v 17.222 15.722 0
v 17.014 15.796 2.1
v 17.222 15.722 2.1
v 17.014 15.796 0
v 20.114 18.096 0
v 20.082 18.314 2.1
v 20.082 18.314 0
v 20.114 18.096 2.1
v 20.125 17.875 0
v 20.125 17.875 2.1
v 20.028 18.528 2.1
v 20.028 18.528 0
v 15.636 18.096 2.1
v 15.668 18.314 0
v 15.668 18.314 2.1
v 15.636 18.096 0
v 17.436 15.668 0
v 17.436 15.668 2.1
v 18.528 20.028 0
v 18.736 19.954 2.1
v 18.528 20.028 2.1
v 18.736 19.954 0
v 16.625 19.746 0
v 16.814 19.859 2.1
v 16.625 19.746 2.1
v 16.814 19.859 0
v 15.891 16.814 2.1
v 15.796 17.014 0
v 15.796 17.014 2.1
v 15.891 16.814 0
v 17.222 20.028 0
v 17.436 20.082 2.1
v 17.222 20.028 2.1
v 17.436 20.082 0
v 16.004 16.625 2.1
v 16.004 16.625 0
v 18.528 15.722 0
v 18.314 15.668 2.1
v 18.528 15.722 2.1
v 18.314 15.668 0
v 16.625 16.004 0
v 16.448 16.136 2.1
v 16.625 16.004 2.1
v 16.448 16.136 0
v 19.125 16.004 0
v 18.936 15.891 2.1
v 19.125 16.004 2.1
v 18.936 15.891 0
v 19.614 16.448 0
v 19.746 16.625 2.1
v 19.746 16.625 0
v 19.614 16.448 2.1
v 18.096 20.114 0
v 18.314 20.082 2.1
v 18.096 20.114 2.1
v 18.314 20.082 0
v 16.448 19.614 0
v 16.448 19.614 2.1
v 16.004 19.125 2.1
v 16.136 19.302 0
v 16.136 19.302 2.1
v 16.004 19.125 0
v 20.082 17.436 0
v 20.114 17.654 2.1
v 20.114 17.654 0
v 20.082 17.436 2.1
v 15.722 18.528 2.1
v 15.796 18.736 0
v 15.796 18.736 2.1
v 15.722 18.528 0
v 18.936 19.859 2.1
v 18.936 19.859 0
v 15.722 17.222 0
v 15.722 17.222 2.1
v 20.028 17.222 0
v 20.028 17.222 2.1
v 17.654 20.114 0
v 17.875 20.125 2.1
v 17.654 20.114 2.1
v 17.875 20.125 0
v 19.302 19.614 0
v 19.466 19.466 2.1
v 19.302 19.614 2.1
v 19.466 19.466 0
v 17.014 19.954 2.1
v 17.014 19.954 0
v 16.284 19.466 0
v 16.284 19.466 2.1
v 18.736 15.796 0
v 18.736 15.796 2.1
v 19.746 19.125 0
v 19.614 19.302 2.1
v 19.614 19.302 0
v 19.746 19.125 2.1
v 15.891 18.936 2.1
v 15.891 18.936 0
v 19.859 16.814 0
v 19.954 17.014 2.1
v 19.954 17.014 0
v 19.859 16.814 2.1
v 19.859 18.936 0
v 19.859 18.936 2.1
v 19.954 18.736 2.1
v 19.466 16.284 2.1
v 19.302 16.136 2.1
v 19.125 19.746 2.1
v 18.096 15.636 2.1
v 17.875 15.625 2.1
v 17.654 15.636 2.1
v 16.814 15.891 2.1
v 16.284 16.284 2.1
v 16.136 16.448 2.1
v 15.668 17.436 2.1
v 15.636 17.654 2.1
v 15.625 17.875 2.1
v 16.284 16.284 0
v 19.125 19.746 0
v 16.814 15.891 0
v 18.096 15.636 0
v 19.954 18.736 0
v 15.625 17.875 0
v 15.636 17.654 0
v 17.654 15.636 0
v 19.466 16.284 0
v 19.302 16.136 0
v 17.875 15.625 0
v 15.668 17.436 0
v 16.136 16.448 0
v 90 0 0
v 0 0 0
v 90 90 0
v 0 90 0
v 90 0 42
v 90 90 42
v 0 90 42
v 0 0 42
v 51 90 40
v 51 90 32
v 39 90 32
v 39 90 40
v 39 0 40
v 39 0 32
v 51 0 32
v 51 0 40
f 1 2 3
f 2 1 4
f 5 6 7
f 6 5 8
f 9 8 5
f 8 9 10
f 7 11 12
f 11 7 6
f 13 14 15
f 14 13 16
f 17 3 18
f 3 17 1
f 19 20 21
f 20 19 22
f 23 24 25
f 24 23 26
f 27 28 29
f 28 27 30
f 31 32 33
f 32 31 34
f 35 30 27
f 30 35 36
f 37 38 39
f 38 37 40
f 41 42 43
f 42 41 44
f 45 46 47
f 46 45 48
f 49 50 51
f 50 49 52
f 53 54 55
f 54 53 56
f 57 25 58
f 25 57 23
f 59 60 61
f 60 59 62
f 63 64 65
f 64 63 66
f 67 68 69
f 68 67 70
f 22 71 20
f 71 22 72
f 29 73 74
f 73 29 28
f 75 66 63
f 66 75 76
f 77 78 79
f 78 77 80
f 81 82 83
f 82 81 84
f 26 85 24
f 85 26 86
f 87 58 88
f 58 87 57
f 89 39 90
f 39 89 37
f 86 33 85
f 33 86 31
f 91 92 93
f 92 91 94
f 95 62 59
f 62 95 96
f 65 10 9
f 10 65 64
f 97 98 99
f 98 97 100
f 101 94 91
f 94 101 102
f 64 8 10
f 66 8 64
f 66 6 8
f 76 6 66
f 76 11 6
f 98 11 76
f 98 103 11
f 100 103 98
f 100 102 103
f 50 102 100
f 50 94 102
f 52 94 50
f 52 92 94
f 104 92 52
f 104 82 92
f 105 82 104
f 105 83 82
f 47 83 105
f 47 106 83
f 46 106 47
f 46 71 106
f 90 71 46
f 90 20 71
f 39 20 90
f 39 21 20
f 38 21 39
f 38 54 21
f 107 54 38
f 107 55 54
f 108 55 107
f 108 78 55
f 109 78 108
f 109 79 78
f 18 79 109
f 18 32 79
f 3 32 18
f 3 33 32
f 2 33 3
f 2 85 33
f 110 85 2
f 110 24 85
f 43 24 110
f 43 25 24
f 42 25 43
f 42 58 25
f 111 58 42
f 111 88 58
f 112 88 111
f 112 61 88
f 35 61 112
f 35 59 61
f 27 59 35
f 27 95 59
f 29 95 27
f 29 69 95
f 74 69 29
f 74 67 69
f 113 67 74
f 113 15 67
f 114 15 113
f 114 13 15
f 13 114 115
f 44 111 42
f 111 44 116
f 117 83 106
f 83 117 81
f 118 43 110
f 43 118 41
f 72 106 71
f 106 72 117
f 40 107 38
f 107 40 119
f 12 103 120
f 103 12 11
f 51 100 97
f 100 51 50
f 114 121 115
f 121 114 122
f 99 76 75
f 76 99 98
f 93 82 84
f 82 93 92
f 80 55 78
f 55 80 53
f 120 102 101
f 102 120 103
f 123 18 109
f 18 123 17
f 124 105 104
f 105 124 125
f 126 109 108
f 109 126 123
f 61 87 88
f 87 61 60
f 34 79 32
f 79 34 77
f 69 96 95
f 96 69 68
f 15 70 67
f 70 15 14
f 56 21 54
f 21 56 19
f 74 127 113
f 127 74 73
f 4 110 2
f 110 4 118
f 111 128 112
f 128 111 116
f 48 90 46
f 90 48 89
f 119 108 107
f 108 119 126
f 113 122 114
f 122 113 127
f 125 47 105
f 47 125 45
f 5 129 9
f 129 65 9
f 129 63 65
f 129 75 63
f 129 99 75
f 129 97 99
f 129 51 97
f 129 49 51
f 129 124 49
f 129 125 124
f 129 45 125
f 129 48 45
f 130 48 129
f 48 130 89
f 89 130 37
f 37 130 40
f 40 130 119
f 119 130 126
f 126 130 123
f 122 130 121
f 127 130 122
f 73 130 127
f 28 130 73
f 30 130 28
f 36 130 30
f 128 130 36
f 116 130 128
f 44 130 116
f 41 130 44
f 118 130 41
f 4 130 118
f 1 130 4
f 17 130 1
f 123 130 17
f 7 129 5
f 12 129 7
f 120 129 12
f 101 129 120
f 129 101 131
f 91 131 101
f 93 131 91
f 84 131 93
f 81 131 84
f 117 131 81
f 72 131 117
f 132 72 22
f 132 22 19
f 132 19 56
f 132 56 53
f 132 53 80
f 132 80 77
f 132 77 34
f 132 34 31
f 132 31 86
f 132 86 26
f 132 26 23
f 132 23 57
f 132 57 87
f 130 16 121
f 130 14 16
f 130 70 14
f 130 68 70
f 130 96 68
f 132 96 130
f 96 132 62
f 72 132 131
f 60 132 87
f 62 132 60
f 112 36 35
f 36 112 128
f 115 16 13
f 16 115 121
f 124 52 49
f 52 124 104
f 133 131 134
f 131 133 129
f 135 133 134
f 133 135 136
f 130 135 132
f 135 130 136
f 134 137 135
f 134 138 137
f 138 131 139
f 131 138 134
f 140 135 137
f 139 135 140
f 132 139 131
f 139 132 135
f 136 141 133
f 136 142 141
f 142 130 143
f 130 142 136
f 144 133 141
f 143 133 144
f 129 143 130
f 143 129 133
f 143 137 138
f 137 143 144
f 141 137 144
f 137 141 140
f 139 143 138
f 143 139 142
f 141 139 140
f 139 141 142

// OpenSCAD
// DIY Magnetic Stirrer Housing
// Based on an 80mm PC case fan
// Print orientation: Upside down (Top plate on bed, walls rising up)

// --- Dimensions ---
// Outer size of the housing
W = 90;
H = 90;

// Thickness of the top plate (resting on bed)
T_TOP = 2;

// Height of the walls
WALL_HEIGHT = 40;

// Wall thickness
WALL_THICK = 2.5;

// Hole specifications
HOLE_DIAM = 4.5;
HOLE_PATTERN_SIZE = 71.5; // Distance between hole centers
HOLE_COUNT = 4;

// Cable notch specifications
NOTCH_WIDTH = 12;
NOTCH_DEPTH_FROM_TOP = 8; // Distance from the open edge (z=40) down to z=32

// --- Derived Dimensions ---
// Inner dimensions (for reference in logic, though we build by subtraction)
I_W = W - 2*WALL_THICK;
I_H = H - 2*WALL_THICK;

// --- Main Body Construction ---
// We build the solid block first, then subtract holes and notches.
// The base is the top plate, walls rise from it.

difference() {
    // 1. The Main Block
    // Dimensions: W x H x (T_TOP + WALL_HEIGHT)
    // Centered at origin.
    // Since it rests on Z=0, the block goes from Z=0 to Z=T_TOP+WALL_HEIGHT.
    block_size = [W, H, T_TOP + WALL_HEIGHT];
    
    union() {
        // We construct the walls and top plate as a single solid block for simplicity,
        // then cut the features.
        cube(block_size);
    }
    
    // 2. Cut the 4 Screw Holes through the top plate
    // Pattern: 71.5mm square centered on the plate.
    // Plate center is (0,0).
    // Holes are at +/- 35.75mm in X and Y.
    for (i = [0, 1]) {
        for (j = [0, 1]) {
            translate([
                (HOLE_PATTERN_SIZE / 2) * (i - 0.5),
                (HOLE_PATTERN_SIZE / 2) * (j - 0.5),
                0 // Start cutting from bottom of top plate
            ]) {
                // Cut a cylinder through the top plate only (depth = T_TOP)
                // Extend slightly past the face to ensure clean cut
                cylinder(
                    h = T_TOP + 0.1, 
                    d = HOLE_DIAM,
                    $fn = 64
                );
            }
        }
    }
    
    // 3. Cut the Cable Notch
    // Location: In one wall. Let's choose the wall at X = +W/2 (Right wall).
    // The notch is 12mm wide, centered along the wall.
    // The wall runs from Y = -H/2 to Y = +H/2.
    // Center of wall in Y is 0.
    // Notch reaches 8mm down from the open edge (Z=40).
    // So it cuts from Z = 40 - 8 = 32 to Z = 40.
    
    translate([
        W/2 - NOTCH_WIDTH/2, // X position: Center of the right wall
        0,                   // Y position: Centered along the wall
        32                   // Z position: Start of the cut (8mm up from bed)
    ]) {
        // Cut a rectangular prism for the notch
        // Width = NOTCH_WIDTH
        // Height = NOTCH_DEPTH_FROM_TOP (8mm)
        // Depth (Z) = 8mm
        cube([NOTCH_WIDTH, H, NOTCH_DEPTH_FROM_TOP]);
    }
}
